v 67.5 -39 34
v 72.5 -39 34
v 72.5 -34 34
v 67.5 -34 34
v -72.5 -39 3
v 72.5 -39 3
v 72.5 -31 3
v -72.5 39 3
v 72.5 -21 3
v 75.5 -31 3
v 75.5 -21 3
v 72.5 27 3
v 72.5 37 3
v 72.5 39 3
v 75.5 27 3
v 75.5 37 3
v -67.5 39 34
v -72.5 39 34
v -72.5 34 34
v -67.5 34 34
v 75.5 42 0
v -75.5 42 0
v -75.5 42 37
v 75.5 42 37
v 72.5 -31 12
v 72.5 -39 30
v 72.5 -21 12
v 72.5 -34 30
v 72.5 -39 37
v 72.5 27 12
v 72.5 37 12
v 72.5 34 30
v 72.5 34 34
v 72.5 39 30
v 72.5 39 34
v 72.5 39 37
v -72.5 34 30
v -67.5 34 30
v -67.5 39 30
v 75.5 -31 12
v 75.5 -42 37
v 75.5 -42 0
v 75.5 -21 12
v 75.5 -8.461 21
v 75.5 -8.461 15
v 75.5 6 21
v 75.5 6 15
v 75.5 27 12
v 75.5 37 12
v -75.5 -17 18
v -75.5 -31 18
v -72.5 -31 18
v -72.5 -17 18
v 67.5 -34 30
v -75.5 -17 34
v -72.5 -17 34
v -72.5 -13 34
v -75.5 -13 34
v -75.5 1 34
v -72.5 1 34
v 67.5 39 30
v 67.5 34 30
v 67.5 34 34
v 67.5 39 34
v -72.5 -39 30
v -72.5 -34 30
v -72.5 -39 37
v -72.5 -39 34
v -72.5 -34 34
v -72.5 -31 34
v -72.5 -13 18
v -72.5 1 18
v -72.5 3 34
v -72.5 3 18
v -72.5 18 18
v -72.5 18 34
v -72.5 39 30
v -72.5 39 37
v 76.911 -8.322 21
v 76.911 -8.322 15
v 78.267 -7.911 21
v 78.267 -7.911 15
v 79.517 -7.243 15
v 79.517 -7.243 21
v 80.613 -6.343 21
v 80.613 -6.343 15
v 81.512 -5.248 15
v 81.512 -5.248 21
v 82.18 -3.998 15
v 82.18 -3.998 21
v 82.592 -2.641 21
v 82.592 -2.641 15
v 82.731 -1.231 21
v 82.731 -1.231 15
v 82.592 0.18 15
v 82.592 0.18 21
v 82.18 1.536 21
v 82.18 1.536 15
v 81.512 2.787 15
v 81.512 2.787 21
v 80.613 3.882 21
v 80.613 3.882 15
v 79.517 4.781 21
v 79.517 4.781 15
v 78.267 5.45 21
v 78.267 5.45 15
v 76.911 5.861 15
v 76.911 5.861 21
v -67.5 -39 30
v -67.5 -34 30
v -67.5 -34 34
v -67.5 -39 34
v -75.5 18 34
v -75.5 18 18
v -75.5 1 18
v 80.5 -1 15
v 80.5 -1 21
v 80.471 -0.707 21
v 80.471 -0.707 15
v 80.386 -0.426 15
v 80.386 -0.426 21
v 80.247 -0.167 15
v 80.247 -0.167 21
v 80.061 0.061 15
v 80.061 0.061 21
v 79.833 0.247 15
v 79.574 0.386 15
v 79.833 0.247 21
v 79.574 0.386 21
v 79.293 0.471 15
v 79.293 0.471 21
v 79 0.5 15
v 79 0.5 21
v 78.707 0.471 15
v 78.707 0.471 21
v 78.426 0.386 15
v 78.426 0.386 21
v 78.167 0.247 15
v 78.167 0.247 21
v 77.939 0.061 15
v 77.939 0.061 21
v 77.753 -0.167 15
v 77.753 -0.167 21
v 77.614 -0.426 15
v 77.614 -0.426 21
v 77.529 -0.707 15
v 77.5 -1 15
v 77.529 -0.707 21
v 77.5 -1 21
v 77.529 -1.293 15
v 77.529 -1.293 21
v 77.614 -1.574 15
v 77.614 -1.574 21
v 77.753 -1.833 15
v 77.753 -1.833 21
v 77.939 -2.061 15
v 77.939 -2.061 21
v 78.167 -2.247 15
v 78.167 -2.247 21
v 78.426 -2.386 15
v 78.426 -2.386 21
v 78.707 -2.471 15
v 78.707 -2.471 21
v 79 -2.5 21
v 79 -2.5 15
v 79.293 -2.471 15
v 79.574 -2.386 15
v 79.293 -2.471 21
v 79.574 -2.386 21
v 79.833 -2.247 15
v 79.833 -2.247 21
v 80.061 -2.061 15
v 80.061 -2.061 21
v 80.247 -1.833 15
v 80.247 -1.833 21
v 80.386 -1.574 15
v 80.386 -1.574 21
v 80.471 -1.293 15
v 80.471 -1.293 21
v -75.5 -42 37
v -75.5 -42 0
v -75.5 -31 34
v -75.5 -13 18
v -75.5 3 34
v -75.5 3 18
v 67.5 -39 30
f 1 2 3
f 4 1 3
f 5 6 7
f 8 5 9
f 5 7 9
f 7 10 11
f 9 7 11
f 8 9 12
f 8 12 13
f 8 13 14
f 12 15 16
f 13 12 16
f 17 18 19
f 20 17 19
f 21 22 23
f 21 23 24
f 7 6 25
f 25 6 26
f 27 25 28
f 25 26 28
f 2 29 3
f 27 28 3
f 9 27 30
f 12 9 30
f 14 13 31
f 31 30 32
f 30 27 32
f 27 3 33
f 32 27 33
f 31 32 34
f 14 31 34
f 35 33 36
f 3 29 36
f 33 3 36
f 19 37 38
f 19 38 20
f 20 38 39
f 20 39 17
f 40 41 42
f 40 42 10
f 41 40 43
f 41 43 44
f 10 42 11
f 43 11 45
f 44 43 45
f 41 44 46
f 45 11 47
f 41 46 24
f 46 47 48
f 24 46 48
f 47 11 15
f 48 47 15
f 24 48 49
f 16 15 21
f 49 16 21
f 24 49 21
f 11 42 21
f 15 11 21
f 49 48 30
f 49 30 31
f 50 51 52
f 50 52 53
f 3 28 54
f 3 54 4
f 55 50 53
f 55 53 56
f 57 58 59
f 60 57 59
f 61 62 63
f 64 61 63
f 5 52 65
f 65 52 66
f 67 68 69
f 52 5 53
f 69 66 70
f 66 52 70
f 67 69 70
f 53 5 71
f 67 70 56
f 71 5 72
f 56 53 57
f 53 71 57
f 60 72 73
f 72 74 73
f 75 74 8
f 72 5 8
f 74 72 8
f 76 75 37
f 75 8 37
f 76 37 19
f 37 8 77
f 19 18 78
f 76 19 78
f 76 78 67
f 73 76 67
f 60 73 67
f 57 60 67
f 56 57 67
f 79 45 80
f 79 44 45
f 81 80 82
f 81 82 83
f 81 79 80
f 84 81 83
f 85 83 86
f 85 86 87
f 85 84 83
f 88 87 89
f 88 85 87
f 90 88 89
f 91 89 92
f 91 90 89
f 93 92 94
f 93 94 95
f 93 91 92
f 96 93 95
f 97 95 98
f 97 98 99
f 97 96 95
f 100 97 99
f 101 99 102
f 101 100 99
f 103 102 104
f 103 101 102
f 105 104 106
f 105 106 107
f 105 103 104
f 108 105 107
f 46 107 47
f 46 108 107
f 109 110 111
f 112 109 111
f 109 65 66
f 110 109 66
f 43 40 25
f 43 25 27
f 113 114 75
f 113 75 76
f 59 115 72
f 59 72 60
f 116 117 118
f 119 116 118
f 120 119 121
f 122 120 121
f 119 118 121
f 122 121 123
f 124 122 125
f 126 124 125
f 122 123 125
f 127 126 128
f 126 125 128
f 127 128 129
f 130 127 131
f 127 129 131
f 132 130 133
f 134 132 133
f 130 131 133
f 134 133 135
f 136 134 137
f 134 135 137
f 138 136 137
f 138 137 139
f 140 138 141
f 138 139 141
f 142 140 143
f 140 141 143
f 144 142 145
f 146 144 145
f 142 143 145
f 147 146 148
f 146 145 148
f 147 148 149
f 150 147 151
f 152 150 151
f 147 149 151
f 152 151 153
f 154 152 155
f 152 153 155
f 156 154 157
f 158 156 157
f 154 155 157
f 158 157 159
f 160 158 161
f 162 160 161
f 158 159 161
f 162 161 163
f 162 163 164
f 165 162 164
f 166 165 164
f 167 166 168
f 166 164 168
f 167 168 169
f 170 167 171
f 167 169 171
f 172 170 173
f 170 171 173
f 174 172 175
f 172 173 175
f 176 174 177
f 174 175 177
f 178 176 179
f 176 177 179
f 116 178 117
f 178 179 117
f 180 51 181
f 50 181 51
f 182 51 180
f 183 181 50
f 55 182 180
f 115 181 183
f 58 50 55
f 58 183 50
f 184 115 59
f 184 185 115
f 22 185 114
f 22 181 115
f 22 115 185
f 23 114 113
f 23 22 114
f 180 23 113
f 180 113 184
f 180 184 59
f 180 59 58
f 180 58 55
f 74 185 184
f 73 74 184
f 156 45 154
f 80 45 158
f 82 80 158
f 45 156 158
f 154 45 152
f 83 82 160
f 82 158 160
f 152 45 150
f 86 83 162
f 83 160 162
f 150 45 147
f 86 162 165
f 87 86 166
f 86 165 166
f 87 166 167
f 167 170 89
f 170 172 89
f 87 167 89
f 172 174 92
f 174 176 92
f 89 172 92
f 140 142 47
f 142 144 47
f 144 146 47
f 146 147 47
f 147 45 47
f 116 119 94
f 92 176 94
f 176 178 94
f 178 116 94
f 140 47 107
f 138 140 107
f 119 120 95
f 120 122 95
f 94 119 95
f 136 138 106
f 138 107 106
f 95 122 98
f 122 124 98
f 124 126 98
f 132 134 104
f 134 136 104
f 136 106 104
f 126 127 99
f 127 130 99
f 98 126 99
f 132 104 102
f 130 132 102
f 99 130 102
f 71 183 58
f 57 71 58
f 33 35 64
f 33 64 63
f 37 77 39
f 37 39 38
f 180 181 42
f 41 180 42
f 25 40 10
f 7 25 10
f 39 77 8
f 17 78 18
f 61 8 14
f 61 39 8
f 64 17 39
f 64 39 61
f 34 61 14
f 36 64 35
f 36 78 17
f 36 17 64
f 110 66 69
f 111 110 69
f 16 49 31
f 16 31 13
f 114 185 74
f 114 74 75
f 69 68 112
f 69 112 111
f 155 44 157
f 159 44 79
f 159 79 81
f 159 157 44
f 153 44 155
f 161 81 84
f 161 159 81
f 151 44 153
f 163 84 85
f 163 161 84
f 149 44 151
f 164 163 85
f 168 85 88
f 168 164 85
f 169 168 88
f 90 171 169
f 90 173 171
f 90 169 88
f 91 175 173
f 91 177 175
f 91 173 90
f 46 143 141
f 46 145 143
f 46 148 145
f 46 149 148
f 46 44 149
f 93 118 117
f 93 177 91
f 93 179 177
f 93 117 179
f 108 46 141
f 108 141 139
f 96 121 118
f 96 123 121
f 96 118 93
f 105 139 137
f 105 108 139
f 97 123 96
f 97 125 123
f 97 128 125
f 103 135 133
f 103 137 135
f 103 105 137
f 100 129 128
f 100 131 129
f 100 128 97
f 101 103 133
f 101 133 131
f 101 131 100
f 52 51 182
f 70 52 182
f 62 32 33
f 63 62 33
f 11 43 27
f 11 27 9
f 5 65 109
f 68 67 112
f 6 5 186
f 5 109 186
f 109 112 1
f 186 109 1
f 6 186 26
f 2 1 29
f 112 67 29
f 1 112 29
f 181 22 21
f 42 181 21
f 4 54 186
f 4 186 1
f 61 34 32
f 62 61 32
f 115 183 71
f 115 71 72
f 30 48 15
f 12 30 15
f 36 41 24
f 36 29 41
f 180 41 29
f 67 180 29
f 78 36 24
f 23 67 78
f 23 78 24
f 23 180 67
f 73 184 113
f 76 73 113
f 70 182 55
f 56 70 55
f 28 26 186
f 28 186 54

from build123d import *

# Parameters (mm, degrees)
SKETCH1_W                = 151
SKETCH1_H                = 84
BOSS_EXTRUDE1_DEPTH      = 37
SKETCH3_W                = 145
SKETCH3_H                = 78
CUT_EXTRUDE3_DEPTH       = 34
SKETCH8_W                = 19
SKETCH8_H                = 14
CUT_EXTRUDE4_DEPTH       = 3
SKETCH9_W                = 19
SKETCH9_H                = 14
CUT_EXTRUDE5_DEPTH       = 3
SKETCH11_W               = 9
SKETCH11_H               = 10
CUT_EXTRUDE6_DEPTH       = 3
SKETCH12_W               = 9
SKETCH12_H               = 10
CUT_EXTRUDE7_DEPTH       = 3
BOSS_EXTRUDE2_DEPTH      = 3
BOSS_EXTRUDE2_DEPTH_BACK = 3
SKETCH19_R               = 1.5
CUT_EXTRUDE8_DEPTH       = 6
SKETCH20_W               = 3
SKETCH20_H               = 14
BOSS_EXTRUDE3_DEPTH      = 3
SKETCH21_W               = 3
SKETCH21_H               = 14
BOSS_EXTRUDE4_DEPTH      = 3
SKETCH23_W               = 16
SKETCH23_H               = 15
CUT_EXTRUDE9_DEPTH       = 3
SKETCH28_W               = 4
SKETCH28_H               = 5
BOSS_EXTRUDE5_DEPTH      = 5
MIRROR2_COPY_1_SKETCH_W  = 4
MIRROR2_COPY_1_SKETCH_H  = 5
MIRROR2_COPY_1_DEPTH     = 5


with BuildPart() as part:
    # Sketch1 → Boss-Extrude1 (new body)
    with BuildSketch(Plane.XY):
        Rectangle(SKETCH1_W, SKETCH1_H)
    extrude(amount=BOSS_EXTRUDE1_DEPTH)

    # Sketch3 → Cut-Extrude3 (cut)
    with BuildSketch(Plane.XY.offset(37)):
        Rectangle(SKETCH3_W, SKETCH3_H)
    extrude(amount=-CUT_EXTRUDE3_DEPTH, mode=Mode.SUBTRACT)

    # Sketch8 → Cut-Extrude4 (cut)
    with BuildSketch(Plane.ZY.offset(75.5)):
        with Locations((27.5, -24)):
            Rectangle(SKETCH8_W, SKETCH8_H)
    extrude(amount=-CUT_EXTRUDE4_DEPTH, mode=Mode.SUBTRACT)

    # Sketch9 → Cut-Extrude5 (cut)
    with BuildSketch(Plane.ZY.offset(75.5)):
        with Locations((27.5, -6)):
            Rectangle(SKETCH9_W, SKETCH9_H)
    extrude(amount=-CUT_EXTRUDE5_DEPTH, mode=Mode.SUBTRACT)

    # Sketch11 → Cut-Extrude6 (cut)
    with BuildSketch(Plane(origin=(75.5, 0, 0), x_dir=(0, 0, -1), z_dir=(1, 0, 0))):
        with Locations((-7.5, 32)):
            Rectangle(SKETCH11_W, SKETCH11_H)
    extrude(amount=-CUT_EXTRUDE6_DEPTH, mode=Mode.SUBTRACT)

    # Sketch12 → Cut-Extrude7 (cut)
    with BuildSketch(Plane(origin=(75.5, 0, 0), x_dir=(0, 0, -1), z_dir=(1, 0, 0))):
        with Locations((-7.5, -26)):
            Rectangle(SKETCH12_W, SKETCH12_H)
    extrude(amount=-CUT_EXTRUDE7_DEPTH, mode=Mode.SUBTRACT)

    # Sketch16 → Boss-Extrude2 (add, two sides)
    with BuildSketch(Plane.XY.offset(18)) as boss_extrude2_sk:
        with BuildLine():
            Line((75.5, 6), (75.5, -8.461119278))
            ThreePointArc((75.5, -8.461119278), (82.730559639, -1.230559639), (75.5, 6))
        make_face()
    extrude(amount=BOSS_EXTRUDE2_DEPTH)
    extrude(boss_extrude2_sk.sketch, amount=-BOSS_EXTRUDE2_DEPTH_BACK)

    # Sketch19 → Cut-Extrude8 (cut)
    with BuildSketch(Plane.XY.offset(21)):
        with Locations((79, -1)):
            Circle(SKETCH19_R)
    extrude(amount=-CUT_EXTRUDE8_DEPTH, mode=Mode.SUBTRACT)

    # Sketch20 → Boss-Extrude3 (add)
    with BuildSketch(Plane.ZY.offset(75.5)):
        with Locations((35.5, -6)):
            Rectangle(SKETCH20_W, SKETCH20_H)
    extrude(amount=-BOSS_EXTRUDE3_DEPTH)

    # Sketch21 → Boss-Extrude4 (add)
    with BuildSketch(Plane.ZY.offset(75.5)):
        with Locations((35.5, -24)):
            Rectangle(SKETCH21_W, SKETCH21_H)
    extrude(amount=-BOSS_EXTRUDE4_DEPTH)

    # Sketch23 → Cut-Extrude9 (cut)
    with BuildSketch(Plane.ZY.offset(75.5)):
        with Locations((26, 10.5)):
            Rectangle(SKETCH23_W, SKETCH23_H)
    extrude(amount=-CUT_EXTRUDE9_DEPTH, mode=Mode.SUBTRACT)

    # Sketch28 → Boss-Extrude5 (add)
    with BuildSketch(Plane.ZY.offset(-72.5)):
        with Locations((32, -36.5)):
            Rectangle(SKETCH28_W, SKETCH28_H)
    boss_extrude5 = extrude(amount=BOSS_EXTRUDE5_DEPTH)

    # Mirror1: Boss-Extrude5 across plane
    add(boss_extrude5.mirror(Plane.ZX))

    # Mirror2: Boss-Extrude5 across plane
    add(boss_extrude5.mirror(Plane(origin=(0, 0, 0), x_dir=(0, 0, 1), z_dir=(1, 0, 0))))

    # Mirror2 copy 1 sketch → Mirror2 copy 1 (add)
    with BuildSketch(Plane(origin=(-72.5, 0, 0), x_dir=(0, 0, 1), z_dir=(1, 0, 0))):
        with Locations((32, -36.5)):
            Rectangle(MIRROR2_COPY_1_SKETCH_W, MIRROR2_COPY_1_SKETCH_H)
    extrude(amount=MIRROR2_COPY_1_DEPTH)


solid = part.part
